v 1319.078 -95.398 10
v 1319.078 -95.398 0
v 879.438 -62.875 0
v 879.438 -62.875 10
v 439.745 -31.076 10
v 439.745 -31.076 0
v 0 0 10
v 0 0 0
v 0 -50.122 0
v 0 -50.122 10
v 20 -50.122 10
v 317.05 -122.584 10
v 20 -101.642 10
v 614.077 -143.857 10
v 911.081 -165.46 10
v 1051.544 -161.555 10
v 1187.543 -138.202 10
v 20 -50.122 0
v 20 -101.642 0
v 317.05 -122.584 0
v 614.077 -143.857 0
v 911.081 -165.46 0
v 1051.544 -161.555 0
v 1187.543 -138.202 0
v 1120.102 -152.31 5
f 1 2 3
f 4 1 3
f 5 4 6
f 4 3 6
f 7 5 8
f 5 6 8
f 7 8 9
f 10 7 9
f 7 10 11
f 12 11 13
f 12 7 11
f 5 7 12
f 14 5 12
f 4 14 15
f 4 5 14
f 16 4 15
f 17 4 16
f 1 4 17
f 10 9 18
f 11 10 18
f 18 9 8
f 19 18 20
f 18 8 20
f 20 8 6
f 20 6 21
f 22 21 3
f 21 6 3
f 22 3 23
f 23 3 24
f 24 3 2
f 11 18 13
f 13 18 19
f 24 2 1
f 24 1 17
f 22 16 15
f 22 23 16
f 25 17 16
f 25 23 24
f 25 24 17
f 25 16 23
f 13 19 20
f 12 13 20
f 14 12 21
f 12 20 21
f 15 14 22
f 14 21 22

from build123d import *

# Parameters (mm, degrees)
BOSS_EXTRUDE1_DEPTH = 10


with BuildPart() as part:
    # Sketch1 → Boss-Extrude1 (new body)
    with BuildSketch(Plane.XY):
        with BuildLine():
            Line((8e-09, 1e-09), (8e-09, -50.121840767))
            Line((8e-09, -50.121840767), (20.000000008, -50.121840767))
            Line((20.000000008, -50.121840767), (20.000000008, -101.641774289))
            ThreePointArc((20.000000008, -101.641774289), (465.566882769, -133.179218179), (911.080534453, -165.459917439))
            add(Edge.make_bspline(
                [(1319.077974178, -95.398302795), (1125.124112684, -174.190190217), (911.080534453, -165.459917439)],
                knots=[0, 0, 0, 1, 1, 1], degree=2))
            ThreePointArc((1319.077974178, -95.398302795), (659.597864045, -46.885056293), (8e-09, 1e-09))
        make_face()
    extrude(amount=BOSS_EXTRUDE1_DEPTH)


solid = part.part
